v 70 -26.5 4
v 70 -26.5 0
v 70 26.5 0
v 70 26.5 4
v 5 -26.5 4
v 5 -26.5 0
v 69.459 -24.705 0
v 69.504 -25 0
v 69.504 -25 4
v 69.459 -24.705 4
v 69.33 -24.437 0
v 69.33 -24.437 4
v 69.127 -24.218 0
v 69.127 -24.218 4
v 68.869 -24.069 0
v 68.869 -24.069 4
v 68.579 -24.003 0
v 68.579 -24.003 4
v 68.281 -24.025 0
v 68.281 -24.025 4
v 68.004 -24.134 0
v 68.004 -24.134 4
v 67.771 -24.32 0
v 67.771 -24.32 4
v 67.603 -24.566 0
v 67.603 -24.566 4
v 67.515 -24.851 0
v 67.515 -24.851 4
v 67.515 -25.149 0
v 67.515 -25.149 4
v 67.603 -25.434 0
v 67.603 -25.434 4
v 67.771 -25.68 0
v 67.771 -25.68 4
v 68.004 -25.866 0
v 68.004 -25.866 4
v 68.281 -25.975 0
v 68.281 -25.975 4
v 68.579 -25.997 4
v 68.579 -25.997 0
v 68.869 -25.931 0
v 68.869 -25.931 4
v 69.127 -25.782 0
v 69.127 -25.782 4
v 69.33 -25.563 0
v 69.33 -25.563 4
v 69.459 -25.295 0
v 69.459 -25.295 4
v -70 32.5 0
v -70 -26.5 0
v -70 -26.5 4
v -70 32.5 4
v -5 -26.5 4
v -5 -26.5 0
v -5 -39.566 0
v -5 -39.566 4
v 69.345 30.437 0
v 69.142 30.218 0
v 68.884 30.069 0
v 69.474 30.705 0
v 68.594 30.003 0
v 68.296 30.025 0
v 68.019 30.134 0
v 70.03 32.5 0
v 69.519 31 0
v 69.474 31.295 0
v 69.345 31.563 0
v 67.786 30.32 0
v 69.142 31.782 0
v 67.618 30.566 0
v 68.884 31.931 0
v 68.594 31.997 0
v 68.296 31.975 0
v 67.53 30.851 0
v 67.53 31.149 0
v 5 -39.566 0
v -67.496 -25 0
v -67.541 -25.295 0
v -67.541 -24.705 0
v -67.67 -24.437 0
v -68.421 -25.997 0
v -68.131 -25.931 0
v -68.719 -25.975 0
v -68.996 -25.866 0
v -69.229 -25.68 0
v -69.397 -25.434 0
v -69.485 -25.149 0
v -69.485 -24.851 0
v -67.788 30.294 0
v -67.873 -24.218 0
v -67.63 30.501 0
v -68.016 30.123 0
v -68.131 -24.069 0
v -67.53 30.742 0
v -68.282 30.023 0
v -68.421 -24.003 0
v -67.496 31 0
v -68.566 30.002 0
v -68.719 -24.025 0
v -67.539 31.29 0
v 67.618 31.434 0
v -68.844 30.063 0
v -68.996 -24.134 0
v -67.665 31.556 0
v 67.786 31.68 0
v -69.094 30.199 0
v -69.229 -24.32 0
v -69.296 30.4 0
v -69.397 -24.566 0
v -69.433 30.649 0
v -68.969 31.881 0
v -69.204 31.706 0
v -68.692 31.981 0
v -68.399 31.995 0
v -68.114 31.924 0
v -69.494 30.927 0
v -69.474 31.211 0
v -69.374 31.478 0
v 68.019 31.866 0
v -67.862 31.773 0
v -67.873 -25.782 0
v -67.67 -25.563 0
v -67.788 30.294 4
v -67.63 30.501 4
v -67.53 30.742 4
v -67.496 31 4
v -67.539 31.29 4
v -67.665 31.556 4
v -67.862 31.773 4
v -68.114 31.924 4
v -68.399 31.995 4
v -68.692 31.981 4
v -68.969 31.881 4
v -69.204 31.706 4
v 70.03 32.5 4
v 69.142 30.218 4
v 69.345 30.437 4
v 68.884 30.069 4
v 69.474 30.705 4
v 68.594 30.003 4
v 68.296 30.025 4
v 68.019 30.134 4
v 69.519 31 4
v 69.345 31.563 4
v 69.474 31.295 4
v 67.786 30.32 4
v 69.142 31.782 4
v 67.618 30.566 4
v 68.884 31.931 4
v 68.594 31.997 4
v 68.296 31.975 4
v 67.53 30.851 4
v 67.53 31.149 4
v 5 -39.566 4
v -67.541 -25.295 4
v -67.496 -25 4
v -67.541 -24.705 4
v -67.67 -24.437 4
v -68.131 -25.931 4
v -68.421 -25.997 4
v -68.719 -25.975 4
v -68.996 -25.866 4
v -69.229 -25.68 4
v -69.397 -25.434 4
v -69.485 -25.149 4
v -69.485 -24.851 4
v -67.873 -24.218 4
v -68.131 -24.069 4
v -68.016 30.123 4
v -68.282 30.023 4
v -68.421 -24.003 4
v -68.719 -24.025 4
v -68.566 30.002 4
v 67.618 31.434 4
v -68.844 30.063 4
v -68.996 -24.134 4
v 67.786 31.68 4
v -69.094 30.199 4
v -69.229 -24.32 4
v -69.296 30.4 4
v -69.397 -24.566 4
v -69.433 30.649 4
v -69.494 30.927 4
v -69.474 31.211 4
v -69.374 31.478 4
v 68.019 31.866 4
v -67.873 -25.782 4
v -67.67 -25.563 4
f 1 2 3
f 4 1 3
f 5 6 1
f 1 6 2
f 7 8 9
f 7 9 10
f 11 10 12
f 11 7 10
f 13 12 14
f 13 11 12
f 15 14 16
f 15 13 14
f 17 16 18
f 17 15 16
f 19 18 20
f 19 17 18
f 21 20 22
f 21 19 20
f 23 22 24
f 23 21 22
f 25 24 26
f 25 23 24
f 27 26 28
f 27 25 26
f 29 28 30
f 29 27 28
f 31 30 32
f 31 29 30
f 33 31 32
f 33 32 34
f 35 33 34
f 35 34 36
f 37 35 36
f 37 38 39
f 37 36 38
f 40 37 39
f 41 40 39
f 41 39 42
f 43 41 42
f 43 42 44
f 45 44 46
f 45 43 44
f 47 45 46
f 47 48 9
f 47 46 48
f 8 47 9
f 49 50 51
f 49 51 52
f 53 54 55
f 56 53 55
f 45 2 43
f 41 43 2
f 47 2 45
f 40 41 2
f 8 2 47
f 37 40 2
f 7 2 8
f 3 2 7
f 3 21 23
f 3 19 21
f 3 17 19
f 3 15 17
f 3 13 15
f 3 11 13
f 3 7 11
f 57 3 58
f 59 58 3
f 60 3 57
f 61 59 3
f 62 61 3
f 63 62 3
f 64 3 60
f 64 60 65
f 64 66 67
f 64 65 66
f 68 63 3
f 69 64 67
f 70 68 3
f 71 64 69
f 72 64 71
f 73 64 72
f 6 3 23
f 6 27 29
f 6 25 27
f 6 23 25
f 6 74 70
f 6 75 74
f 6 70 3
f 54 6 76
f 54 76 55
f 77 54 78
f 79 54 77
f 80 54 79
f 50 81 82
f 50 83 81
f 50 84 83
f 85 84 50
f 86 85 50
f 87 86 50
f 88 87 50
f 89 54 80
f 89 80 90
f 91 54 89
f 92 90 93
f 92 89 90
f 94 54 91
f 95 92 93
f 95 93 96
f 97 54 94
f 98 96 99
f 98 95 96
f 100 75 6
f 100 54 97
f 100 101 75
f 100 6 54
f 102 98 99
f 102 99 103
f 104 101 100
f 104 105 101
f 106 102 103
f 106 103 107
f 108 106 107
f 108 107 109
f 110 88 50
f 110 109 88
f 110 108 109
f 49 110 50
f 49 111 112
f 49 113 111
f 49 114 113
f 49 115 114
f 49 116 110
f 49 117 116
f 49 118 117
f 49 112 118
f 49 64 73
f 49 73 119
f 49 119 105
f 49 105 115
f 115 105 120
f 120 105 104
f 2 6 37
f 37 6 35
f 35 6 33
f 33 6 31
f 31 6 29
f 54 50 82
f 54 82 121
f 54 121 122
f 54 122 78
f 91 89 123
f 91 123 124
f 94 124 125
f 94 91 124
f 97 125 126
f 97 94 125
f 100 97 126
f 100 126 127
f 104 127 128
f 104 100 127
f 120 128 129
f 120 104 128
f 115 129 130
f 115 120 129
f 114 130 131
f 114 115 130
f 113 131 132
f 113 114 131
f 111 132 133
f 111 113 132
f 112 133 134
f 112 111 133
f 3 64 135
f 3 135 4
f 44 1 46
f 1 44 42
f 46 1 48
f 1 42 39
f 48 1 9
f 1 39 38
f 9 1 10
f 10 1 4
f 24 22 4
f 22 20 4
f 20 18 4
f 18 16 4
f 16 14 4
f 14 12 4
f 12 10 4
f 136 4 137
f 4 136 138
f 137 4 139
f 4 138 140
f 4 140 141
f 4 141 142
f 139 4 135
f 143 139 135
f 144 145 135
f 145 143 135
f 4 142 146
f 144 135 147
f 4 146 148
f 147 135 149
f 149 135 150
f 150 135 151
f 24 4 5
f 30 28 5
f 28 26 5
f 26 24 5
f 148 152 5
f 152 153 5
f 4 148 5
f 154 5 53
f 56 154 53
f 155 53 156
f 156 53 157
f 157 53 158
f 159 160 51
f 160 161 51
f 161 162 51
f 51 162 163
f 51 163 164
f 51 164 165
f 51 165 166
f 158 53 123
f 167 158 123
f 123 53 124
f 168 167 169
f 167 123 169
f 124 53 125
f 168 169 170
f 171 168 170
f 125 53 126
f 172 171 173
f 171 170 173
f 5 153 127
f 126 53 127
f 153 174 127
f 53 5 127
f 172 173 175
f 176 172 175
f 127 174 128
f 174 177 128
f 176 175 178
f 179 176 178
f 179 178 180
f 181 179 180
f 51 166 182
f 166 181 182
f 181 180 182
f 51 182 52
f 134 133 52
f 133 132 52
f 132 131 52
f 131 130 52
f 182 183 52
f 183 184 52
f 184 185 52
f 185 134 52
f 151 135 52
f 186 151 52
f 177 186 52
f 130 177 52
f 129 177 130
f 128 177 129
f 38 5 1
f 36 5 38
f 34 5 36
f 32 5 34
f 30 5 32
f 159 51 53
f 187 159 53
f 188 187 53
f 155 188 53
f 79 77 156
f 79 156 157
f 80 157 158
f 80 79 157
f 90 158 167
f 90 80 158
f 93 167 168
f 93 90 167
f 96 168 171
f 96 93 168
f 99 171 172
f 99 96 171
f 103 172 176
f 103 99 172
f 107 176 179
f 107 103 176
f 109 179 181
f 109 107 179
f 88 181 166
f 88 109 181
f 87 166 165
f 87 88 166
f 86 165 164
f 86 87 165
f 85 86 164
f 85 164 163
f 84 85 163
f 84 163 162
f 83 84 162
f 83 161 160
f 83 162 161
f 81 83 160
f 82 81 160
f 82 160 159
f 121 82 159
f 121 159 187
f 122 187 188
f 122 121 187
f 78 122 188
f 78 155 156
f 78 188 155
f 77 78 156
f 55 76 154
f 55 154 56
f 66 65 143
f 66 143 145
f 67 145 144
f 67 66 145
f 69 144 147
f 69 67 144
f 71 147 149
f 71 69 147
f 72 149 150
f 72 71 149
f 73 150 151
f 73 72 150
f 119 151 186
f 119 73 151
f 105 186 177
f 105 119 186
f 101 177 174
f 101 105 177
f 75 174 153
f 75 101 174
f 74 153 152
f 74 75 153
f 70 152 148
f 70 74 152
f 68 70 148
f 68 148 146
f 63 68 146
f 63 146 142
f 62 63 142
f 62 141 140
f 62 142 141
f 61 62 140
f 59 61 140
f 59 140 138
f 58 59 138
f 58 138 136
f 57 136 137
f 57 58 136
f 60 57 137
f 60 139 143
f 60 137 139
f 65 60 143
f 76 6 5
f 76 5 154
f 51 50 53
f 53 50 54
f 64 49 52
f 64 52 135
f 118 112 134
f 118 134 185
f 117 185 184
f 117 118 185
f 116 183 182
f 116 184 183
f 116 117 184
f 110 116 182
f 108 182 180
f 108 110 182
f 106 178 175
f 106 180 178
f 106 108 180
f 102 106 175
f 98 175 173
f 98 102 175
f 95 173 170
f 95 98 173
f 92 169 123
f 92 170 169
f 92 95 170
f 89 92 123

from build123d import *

# Parameters (mm, degrees)
BOSS_EXTRUDE1_DEPTH     = 4
SKETCH1_W               = 140
SKETCH1_H               = 53
BOSS_EXTRUDE2_DEPTH     = 4
BOSS_EXTRUDE3_DEPTH     = 4
CUT_EXTRUDE1_DEPTH      = 5
CUT_EXTRUDE1_DEPTH_BACK = 2
CUT_EXTRUDE4_DEPTH      = 81.533747288
CUT_EXTRUDE4_DEPTH_BACK = 81.533747288
SKETCH4_R               = 1


with BuildPart() as part:
    # Sketch3 → Boss-Extrude1 (new body)
    with BuildSketch(Plane.XY):
        Polygon((0, -26.5), (5, -26.5), (5, -39.566040215), (-4.99956385, -39.566040215), (-4.99956385, -26.566040215), (-4.99956385, -26.5), align=None)
    extrude(amount=BOSS_EXTRUDE1_DEPTH)

    # Sketch1 → Boss-Extrude2 (add)
    with BuildSketch(Plane.XY):
        Rectangle(SKETCH1_W, SKETCH1_H)
    extrude(amount=BOSS_EXTRUDE2_DEPTH)

    # Sketch5 → Boss-Extrude3 (add)
    with BuildSketch(Plane.XY):
        Polygon((-70, 26.5), (-70, 32.5), (70.030085777, 32.5), (70, 26.5), align=None)
    extrude(amount=BOSS_EXTRUDE3_DEPTH)

    # Sketch6 → Cut-Extrude1 (cut, two sides: drawn at the far end of the back side and taken through both)
    with BuildSketch(Plane.XY.offset(-CUT_EXTRUDE1_DEPTH_BACK)):
        with BuildLine():
            ThreePointArc((-67.496184759, 31), (-68.114088128, 31.924122375), (-69.204189088, 31.706208093))
            Line((-69.204189088, 31.706208093), (-67.78818043, 30.293791907))
            ThreePointArc((-67.78818043, 30.293791907), (-67.572062384, 30.617903369), (-67.496184759, 31))
        make_face()
        with BuildLine():
            Line((-67.78818043, 30.293791907), (-69.204189088, 31.706208093))
            ThreePointArc((-69.204189088, 31.706208093), (-69.202392852, 30.291995671), (-67.78818043, 30.293791907))
        make_face()
    extrude(amount=CUT_EXTRUDE1_DEPTH + CUT_EXTRUDE1_DEPTH_BACK, mode=Mode.SUBTRACT)

    # Sketch4 → Cut-Extrude4 (cut, two sides: drawn at the far end of the back side and taken through both)
    with BuildSketch(Plane.XY.offset(-CUT_EXTRUDE4_DEPTH_BACK)):
        with Locations((-68.496184759, -25)):
            Circle(SKETCH4_R)
        with Locations((68.503815241, -25)):
            Circle(SKETCH4_R)
        with Locations((68.518858129, 31)):
            Circle(SKETCH4_R)
    extrude(amount=CUT_EXTRUDE4_DEPTH + CUT_EXTRUDE4_DEPTH_BACK, mode=Mode.SUBTRACT)


solid = part.part
